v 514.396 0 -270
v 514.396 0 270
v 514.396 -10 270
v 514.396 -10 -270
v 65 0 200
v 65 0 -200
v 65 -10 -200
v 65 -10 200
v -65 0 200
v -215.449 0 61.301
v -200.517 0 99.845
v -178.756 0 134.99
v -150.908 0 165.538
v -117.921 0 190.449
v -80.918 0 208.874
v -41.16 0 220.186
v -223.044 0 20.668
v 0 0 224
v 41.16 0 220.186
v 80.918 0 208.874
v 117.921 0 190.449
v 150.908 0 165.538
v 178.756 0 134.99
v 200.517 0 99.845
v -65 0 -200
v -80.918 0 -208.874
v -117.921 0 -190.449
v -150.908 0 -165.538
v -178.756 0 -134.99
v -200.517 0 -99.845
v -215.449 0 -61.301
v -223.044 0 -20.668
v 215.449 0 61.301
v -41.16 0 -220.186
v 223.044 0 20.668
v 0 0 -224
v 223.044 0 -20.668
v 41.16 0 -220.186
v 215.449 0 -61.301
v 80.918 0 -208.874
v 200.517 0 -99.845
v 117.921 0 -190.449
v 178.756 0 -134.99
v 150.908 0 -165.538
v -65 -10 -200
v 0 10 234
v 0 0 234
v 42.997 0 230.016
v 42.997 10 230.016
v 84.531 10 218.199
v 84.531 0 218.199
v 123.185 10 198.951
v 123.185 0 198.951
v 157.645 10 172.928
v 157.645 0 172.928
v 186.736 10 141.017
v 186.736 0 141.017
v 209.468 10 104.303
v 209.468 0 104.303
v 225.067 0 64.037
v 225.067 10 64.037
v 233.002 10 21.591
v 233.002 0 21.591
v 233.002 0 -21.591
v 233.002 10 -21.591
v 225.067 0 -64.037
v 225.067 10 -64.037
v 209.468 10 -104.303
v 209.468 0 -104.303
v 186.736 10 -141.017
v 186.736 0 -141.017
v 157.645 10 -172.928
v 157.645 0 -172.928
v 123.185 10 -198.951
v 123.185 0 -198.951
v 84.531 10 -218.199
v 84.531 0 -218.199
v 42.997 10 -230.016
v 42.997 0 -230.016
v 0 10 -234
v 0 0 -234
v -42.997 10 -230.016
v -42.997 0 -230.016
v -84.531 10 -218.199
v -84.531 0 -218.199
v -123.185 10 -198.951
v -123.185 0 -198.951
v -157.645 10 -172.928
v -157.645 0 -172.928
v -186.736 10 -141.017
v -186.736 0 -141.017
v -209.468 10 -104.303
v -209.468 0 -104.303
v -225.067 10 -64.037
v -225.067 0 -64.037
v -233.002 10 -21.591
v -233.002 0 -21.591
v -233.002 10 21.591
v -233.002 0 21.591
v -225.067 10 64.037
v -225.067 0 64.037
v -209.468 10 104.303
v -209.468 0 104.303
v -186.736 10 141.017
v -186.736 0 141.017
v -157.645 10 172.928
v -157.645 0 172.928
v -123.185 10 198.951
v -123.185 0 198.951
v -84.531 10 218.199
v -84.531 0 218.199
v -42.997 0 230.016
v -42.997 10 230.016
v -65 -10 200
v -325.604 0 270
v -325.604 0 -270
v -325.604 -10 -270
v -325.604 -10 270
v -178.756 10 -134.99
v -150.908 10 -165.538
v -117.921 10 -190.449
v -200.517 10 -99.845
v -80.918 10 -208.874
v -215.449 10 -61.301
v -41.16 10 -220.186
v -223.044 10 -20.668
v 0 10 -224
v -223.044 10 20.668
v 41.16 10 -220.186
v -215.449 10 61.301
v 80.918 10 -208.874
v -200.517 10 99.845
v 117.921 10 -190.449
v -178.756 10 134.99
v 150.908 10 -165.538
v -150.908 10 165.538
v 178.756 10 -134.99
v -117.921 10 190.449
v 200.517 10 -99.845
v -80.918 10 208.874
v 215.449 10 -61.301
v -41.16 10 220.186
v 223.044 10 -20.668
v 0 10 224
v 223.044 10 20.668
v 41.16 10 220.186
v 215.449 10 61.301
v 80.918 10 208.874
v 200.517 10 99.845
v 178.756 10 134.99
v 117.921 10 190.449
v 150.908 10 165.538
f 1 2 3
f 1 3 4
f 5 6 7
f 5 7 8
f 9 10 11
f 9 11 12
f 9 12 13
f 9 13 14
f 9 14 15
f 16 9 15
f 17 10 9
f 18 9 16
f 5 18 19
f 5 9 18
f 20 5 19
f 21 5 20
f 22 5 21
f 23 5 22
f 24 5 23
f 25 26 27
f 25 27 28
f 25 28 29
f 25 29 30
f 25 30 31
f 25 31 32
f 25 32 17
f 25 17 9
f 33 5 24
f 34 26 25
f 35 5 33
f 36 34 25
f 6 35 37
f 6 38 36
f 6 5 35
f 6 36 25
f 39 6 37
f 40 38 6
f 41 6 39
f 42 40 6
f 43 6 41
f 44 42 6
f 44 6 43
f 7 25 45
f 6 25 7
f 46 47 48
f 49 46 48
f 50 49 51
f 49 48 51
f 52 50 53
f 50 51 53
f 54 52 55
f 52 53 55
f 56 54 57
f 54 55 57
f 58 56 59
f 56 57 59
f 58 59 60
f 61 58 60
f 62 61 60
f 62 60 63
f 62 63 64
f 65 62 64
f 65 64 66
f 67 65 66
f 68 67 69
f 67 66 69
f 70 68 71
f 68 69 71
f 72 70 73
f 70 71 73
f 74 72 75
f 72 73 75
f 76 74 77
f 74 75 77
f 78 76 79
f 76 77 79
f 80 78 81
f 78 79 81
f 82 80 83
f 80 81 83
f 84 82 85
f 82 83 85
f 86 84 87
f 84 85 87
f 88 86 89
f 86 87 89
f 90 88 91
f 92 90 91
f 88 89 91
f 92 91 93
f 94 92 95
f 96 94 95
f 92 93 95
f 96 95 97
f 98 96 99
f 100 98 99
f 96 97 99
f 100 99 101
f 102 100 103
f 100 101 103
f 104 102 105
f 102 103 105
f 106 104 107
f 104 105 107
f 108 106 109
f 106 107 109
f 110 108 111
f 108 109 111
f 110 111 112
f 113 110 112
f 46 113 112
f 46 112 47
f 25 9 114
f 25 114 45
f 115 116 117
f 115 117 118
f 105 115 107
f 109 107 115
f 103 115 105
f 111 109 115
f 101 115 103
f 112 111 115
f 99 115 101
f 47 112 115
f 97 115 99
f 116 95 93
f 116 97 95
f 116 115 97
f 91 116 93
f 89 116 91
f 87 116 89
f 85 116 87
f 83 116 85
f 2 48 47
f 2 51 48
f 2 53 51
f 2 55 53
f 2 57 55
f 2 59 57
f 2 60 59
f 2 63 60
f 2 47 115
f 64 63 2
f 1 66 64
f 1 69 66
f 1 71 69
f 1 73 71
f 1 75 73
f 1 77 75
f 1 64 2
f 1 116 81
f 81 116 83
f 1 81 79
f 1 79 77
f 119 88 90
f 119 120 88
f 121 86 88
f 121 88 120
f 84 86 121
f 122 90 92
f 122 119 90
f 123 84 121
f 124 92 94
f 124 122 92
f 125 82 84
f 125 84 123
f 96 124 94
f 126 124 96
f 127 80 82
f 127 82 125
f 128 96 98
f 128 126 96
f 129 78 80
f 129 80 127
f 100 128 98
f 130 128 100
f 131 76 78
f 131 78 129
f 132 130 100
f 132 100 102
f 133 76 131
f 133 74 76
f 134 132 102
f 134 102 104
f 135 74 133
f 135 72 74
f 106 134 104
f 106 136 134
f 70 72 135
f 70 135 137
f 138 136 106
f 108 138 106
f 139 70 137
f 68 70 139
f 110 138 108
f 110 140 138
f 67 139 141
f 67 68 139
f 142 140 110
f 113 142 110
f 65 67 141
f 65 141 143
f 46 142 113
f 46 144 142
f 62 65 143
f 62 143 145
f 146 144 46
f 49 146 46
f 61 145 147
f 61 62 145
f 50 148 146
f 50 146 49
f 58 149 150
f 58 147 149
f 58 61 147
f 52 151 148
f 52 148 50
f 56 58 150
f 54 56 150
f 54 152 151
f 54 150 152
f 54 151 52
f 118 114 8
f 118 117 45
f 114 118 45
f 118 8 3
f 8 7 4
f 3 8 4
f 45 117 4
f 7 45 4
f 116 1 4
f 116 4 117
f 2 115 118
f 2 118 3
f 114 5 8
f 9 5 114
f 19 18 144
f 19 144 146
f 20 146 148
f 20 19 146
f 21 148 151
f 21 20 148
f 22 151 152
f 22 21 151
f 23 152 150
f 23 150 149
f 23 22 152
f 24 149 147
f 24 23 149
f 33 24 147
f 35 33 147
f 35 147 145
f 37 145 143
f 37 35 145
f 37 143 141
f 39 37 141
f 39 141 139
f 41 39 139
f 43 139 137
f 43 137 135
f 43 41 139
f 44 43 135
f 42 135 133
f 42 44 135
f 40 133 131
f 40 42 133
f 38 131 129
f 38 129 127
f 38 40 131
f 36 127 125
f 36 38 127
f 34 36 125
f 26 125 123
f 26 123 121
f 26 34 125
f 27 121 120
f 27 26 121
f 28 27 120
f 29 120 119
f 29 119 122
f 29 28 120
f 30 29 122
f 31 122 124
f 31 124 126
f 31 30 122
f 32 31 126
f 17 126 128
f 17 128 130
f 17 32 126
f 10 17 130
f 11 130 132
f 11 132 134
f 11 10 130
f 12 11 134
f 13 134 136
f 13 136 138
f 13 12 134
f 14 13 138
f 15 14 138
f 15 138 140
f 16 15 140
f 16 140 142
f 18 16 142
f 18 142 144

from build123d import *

# Parameters (mm, degrees)
BOSS_EXTRUDE1_DEPTH = 10
BOSS_EXTRUDE2_DEPTH = 10


with BuildPart() as part:
    # Sketch1 → Boss-Extrude1 (new body)
    with BuildSketch(Plane(origin=(0, 0, 0), x_dir=(1, 0, 0), z_dir=(0, 1, 0))):
        Polygon((514.396103797, 270), (0, 270), (-325.603896203, 270), (-325.603896203, -270), (514.396103797, -270), align=None)
        Polygon((-65, 200), (0, 200), (65, 200), (65, -200), (-65, -200), align=None, mode=Mode.SUBTRACT)
    extrude(amount=-BOSS_EXTRUDE1_DEPTH)

    # Sketch1<3> → Boss-Extrude2 (add)
    with BuildSketch(Plane(origin=(0, 0, 0), x_dir=(1, 0, 0), z_dir=(0, 1, 0))):
        with BuildLine():
            ThreePointArc((234, 0), (165.462986798, 165.462986798), (0, 234))
            ThreePointArc((0, 234), (-165.462986798, -165.462986798), (234, 0))
        make_face()
        with BuildLine():
            ThreePointArc((224, 0), (-158.391918986, -158.391918986), (0, 224))
            ThreePointArc((0, 224), (158.391918986, 158.391918986), (224, 0))
        make_face(mode=Mode.SUBTRACT)
    extrude(amount=BOSS_EXTRUDE2_DEPTH)


solid = part.part
